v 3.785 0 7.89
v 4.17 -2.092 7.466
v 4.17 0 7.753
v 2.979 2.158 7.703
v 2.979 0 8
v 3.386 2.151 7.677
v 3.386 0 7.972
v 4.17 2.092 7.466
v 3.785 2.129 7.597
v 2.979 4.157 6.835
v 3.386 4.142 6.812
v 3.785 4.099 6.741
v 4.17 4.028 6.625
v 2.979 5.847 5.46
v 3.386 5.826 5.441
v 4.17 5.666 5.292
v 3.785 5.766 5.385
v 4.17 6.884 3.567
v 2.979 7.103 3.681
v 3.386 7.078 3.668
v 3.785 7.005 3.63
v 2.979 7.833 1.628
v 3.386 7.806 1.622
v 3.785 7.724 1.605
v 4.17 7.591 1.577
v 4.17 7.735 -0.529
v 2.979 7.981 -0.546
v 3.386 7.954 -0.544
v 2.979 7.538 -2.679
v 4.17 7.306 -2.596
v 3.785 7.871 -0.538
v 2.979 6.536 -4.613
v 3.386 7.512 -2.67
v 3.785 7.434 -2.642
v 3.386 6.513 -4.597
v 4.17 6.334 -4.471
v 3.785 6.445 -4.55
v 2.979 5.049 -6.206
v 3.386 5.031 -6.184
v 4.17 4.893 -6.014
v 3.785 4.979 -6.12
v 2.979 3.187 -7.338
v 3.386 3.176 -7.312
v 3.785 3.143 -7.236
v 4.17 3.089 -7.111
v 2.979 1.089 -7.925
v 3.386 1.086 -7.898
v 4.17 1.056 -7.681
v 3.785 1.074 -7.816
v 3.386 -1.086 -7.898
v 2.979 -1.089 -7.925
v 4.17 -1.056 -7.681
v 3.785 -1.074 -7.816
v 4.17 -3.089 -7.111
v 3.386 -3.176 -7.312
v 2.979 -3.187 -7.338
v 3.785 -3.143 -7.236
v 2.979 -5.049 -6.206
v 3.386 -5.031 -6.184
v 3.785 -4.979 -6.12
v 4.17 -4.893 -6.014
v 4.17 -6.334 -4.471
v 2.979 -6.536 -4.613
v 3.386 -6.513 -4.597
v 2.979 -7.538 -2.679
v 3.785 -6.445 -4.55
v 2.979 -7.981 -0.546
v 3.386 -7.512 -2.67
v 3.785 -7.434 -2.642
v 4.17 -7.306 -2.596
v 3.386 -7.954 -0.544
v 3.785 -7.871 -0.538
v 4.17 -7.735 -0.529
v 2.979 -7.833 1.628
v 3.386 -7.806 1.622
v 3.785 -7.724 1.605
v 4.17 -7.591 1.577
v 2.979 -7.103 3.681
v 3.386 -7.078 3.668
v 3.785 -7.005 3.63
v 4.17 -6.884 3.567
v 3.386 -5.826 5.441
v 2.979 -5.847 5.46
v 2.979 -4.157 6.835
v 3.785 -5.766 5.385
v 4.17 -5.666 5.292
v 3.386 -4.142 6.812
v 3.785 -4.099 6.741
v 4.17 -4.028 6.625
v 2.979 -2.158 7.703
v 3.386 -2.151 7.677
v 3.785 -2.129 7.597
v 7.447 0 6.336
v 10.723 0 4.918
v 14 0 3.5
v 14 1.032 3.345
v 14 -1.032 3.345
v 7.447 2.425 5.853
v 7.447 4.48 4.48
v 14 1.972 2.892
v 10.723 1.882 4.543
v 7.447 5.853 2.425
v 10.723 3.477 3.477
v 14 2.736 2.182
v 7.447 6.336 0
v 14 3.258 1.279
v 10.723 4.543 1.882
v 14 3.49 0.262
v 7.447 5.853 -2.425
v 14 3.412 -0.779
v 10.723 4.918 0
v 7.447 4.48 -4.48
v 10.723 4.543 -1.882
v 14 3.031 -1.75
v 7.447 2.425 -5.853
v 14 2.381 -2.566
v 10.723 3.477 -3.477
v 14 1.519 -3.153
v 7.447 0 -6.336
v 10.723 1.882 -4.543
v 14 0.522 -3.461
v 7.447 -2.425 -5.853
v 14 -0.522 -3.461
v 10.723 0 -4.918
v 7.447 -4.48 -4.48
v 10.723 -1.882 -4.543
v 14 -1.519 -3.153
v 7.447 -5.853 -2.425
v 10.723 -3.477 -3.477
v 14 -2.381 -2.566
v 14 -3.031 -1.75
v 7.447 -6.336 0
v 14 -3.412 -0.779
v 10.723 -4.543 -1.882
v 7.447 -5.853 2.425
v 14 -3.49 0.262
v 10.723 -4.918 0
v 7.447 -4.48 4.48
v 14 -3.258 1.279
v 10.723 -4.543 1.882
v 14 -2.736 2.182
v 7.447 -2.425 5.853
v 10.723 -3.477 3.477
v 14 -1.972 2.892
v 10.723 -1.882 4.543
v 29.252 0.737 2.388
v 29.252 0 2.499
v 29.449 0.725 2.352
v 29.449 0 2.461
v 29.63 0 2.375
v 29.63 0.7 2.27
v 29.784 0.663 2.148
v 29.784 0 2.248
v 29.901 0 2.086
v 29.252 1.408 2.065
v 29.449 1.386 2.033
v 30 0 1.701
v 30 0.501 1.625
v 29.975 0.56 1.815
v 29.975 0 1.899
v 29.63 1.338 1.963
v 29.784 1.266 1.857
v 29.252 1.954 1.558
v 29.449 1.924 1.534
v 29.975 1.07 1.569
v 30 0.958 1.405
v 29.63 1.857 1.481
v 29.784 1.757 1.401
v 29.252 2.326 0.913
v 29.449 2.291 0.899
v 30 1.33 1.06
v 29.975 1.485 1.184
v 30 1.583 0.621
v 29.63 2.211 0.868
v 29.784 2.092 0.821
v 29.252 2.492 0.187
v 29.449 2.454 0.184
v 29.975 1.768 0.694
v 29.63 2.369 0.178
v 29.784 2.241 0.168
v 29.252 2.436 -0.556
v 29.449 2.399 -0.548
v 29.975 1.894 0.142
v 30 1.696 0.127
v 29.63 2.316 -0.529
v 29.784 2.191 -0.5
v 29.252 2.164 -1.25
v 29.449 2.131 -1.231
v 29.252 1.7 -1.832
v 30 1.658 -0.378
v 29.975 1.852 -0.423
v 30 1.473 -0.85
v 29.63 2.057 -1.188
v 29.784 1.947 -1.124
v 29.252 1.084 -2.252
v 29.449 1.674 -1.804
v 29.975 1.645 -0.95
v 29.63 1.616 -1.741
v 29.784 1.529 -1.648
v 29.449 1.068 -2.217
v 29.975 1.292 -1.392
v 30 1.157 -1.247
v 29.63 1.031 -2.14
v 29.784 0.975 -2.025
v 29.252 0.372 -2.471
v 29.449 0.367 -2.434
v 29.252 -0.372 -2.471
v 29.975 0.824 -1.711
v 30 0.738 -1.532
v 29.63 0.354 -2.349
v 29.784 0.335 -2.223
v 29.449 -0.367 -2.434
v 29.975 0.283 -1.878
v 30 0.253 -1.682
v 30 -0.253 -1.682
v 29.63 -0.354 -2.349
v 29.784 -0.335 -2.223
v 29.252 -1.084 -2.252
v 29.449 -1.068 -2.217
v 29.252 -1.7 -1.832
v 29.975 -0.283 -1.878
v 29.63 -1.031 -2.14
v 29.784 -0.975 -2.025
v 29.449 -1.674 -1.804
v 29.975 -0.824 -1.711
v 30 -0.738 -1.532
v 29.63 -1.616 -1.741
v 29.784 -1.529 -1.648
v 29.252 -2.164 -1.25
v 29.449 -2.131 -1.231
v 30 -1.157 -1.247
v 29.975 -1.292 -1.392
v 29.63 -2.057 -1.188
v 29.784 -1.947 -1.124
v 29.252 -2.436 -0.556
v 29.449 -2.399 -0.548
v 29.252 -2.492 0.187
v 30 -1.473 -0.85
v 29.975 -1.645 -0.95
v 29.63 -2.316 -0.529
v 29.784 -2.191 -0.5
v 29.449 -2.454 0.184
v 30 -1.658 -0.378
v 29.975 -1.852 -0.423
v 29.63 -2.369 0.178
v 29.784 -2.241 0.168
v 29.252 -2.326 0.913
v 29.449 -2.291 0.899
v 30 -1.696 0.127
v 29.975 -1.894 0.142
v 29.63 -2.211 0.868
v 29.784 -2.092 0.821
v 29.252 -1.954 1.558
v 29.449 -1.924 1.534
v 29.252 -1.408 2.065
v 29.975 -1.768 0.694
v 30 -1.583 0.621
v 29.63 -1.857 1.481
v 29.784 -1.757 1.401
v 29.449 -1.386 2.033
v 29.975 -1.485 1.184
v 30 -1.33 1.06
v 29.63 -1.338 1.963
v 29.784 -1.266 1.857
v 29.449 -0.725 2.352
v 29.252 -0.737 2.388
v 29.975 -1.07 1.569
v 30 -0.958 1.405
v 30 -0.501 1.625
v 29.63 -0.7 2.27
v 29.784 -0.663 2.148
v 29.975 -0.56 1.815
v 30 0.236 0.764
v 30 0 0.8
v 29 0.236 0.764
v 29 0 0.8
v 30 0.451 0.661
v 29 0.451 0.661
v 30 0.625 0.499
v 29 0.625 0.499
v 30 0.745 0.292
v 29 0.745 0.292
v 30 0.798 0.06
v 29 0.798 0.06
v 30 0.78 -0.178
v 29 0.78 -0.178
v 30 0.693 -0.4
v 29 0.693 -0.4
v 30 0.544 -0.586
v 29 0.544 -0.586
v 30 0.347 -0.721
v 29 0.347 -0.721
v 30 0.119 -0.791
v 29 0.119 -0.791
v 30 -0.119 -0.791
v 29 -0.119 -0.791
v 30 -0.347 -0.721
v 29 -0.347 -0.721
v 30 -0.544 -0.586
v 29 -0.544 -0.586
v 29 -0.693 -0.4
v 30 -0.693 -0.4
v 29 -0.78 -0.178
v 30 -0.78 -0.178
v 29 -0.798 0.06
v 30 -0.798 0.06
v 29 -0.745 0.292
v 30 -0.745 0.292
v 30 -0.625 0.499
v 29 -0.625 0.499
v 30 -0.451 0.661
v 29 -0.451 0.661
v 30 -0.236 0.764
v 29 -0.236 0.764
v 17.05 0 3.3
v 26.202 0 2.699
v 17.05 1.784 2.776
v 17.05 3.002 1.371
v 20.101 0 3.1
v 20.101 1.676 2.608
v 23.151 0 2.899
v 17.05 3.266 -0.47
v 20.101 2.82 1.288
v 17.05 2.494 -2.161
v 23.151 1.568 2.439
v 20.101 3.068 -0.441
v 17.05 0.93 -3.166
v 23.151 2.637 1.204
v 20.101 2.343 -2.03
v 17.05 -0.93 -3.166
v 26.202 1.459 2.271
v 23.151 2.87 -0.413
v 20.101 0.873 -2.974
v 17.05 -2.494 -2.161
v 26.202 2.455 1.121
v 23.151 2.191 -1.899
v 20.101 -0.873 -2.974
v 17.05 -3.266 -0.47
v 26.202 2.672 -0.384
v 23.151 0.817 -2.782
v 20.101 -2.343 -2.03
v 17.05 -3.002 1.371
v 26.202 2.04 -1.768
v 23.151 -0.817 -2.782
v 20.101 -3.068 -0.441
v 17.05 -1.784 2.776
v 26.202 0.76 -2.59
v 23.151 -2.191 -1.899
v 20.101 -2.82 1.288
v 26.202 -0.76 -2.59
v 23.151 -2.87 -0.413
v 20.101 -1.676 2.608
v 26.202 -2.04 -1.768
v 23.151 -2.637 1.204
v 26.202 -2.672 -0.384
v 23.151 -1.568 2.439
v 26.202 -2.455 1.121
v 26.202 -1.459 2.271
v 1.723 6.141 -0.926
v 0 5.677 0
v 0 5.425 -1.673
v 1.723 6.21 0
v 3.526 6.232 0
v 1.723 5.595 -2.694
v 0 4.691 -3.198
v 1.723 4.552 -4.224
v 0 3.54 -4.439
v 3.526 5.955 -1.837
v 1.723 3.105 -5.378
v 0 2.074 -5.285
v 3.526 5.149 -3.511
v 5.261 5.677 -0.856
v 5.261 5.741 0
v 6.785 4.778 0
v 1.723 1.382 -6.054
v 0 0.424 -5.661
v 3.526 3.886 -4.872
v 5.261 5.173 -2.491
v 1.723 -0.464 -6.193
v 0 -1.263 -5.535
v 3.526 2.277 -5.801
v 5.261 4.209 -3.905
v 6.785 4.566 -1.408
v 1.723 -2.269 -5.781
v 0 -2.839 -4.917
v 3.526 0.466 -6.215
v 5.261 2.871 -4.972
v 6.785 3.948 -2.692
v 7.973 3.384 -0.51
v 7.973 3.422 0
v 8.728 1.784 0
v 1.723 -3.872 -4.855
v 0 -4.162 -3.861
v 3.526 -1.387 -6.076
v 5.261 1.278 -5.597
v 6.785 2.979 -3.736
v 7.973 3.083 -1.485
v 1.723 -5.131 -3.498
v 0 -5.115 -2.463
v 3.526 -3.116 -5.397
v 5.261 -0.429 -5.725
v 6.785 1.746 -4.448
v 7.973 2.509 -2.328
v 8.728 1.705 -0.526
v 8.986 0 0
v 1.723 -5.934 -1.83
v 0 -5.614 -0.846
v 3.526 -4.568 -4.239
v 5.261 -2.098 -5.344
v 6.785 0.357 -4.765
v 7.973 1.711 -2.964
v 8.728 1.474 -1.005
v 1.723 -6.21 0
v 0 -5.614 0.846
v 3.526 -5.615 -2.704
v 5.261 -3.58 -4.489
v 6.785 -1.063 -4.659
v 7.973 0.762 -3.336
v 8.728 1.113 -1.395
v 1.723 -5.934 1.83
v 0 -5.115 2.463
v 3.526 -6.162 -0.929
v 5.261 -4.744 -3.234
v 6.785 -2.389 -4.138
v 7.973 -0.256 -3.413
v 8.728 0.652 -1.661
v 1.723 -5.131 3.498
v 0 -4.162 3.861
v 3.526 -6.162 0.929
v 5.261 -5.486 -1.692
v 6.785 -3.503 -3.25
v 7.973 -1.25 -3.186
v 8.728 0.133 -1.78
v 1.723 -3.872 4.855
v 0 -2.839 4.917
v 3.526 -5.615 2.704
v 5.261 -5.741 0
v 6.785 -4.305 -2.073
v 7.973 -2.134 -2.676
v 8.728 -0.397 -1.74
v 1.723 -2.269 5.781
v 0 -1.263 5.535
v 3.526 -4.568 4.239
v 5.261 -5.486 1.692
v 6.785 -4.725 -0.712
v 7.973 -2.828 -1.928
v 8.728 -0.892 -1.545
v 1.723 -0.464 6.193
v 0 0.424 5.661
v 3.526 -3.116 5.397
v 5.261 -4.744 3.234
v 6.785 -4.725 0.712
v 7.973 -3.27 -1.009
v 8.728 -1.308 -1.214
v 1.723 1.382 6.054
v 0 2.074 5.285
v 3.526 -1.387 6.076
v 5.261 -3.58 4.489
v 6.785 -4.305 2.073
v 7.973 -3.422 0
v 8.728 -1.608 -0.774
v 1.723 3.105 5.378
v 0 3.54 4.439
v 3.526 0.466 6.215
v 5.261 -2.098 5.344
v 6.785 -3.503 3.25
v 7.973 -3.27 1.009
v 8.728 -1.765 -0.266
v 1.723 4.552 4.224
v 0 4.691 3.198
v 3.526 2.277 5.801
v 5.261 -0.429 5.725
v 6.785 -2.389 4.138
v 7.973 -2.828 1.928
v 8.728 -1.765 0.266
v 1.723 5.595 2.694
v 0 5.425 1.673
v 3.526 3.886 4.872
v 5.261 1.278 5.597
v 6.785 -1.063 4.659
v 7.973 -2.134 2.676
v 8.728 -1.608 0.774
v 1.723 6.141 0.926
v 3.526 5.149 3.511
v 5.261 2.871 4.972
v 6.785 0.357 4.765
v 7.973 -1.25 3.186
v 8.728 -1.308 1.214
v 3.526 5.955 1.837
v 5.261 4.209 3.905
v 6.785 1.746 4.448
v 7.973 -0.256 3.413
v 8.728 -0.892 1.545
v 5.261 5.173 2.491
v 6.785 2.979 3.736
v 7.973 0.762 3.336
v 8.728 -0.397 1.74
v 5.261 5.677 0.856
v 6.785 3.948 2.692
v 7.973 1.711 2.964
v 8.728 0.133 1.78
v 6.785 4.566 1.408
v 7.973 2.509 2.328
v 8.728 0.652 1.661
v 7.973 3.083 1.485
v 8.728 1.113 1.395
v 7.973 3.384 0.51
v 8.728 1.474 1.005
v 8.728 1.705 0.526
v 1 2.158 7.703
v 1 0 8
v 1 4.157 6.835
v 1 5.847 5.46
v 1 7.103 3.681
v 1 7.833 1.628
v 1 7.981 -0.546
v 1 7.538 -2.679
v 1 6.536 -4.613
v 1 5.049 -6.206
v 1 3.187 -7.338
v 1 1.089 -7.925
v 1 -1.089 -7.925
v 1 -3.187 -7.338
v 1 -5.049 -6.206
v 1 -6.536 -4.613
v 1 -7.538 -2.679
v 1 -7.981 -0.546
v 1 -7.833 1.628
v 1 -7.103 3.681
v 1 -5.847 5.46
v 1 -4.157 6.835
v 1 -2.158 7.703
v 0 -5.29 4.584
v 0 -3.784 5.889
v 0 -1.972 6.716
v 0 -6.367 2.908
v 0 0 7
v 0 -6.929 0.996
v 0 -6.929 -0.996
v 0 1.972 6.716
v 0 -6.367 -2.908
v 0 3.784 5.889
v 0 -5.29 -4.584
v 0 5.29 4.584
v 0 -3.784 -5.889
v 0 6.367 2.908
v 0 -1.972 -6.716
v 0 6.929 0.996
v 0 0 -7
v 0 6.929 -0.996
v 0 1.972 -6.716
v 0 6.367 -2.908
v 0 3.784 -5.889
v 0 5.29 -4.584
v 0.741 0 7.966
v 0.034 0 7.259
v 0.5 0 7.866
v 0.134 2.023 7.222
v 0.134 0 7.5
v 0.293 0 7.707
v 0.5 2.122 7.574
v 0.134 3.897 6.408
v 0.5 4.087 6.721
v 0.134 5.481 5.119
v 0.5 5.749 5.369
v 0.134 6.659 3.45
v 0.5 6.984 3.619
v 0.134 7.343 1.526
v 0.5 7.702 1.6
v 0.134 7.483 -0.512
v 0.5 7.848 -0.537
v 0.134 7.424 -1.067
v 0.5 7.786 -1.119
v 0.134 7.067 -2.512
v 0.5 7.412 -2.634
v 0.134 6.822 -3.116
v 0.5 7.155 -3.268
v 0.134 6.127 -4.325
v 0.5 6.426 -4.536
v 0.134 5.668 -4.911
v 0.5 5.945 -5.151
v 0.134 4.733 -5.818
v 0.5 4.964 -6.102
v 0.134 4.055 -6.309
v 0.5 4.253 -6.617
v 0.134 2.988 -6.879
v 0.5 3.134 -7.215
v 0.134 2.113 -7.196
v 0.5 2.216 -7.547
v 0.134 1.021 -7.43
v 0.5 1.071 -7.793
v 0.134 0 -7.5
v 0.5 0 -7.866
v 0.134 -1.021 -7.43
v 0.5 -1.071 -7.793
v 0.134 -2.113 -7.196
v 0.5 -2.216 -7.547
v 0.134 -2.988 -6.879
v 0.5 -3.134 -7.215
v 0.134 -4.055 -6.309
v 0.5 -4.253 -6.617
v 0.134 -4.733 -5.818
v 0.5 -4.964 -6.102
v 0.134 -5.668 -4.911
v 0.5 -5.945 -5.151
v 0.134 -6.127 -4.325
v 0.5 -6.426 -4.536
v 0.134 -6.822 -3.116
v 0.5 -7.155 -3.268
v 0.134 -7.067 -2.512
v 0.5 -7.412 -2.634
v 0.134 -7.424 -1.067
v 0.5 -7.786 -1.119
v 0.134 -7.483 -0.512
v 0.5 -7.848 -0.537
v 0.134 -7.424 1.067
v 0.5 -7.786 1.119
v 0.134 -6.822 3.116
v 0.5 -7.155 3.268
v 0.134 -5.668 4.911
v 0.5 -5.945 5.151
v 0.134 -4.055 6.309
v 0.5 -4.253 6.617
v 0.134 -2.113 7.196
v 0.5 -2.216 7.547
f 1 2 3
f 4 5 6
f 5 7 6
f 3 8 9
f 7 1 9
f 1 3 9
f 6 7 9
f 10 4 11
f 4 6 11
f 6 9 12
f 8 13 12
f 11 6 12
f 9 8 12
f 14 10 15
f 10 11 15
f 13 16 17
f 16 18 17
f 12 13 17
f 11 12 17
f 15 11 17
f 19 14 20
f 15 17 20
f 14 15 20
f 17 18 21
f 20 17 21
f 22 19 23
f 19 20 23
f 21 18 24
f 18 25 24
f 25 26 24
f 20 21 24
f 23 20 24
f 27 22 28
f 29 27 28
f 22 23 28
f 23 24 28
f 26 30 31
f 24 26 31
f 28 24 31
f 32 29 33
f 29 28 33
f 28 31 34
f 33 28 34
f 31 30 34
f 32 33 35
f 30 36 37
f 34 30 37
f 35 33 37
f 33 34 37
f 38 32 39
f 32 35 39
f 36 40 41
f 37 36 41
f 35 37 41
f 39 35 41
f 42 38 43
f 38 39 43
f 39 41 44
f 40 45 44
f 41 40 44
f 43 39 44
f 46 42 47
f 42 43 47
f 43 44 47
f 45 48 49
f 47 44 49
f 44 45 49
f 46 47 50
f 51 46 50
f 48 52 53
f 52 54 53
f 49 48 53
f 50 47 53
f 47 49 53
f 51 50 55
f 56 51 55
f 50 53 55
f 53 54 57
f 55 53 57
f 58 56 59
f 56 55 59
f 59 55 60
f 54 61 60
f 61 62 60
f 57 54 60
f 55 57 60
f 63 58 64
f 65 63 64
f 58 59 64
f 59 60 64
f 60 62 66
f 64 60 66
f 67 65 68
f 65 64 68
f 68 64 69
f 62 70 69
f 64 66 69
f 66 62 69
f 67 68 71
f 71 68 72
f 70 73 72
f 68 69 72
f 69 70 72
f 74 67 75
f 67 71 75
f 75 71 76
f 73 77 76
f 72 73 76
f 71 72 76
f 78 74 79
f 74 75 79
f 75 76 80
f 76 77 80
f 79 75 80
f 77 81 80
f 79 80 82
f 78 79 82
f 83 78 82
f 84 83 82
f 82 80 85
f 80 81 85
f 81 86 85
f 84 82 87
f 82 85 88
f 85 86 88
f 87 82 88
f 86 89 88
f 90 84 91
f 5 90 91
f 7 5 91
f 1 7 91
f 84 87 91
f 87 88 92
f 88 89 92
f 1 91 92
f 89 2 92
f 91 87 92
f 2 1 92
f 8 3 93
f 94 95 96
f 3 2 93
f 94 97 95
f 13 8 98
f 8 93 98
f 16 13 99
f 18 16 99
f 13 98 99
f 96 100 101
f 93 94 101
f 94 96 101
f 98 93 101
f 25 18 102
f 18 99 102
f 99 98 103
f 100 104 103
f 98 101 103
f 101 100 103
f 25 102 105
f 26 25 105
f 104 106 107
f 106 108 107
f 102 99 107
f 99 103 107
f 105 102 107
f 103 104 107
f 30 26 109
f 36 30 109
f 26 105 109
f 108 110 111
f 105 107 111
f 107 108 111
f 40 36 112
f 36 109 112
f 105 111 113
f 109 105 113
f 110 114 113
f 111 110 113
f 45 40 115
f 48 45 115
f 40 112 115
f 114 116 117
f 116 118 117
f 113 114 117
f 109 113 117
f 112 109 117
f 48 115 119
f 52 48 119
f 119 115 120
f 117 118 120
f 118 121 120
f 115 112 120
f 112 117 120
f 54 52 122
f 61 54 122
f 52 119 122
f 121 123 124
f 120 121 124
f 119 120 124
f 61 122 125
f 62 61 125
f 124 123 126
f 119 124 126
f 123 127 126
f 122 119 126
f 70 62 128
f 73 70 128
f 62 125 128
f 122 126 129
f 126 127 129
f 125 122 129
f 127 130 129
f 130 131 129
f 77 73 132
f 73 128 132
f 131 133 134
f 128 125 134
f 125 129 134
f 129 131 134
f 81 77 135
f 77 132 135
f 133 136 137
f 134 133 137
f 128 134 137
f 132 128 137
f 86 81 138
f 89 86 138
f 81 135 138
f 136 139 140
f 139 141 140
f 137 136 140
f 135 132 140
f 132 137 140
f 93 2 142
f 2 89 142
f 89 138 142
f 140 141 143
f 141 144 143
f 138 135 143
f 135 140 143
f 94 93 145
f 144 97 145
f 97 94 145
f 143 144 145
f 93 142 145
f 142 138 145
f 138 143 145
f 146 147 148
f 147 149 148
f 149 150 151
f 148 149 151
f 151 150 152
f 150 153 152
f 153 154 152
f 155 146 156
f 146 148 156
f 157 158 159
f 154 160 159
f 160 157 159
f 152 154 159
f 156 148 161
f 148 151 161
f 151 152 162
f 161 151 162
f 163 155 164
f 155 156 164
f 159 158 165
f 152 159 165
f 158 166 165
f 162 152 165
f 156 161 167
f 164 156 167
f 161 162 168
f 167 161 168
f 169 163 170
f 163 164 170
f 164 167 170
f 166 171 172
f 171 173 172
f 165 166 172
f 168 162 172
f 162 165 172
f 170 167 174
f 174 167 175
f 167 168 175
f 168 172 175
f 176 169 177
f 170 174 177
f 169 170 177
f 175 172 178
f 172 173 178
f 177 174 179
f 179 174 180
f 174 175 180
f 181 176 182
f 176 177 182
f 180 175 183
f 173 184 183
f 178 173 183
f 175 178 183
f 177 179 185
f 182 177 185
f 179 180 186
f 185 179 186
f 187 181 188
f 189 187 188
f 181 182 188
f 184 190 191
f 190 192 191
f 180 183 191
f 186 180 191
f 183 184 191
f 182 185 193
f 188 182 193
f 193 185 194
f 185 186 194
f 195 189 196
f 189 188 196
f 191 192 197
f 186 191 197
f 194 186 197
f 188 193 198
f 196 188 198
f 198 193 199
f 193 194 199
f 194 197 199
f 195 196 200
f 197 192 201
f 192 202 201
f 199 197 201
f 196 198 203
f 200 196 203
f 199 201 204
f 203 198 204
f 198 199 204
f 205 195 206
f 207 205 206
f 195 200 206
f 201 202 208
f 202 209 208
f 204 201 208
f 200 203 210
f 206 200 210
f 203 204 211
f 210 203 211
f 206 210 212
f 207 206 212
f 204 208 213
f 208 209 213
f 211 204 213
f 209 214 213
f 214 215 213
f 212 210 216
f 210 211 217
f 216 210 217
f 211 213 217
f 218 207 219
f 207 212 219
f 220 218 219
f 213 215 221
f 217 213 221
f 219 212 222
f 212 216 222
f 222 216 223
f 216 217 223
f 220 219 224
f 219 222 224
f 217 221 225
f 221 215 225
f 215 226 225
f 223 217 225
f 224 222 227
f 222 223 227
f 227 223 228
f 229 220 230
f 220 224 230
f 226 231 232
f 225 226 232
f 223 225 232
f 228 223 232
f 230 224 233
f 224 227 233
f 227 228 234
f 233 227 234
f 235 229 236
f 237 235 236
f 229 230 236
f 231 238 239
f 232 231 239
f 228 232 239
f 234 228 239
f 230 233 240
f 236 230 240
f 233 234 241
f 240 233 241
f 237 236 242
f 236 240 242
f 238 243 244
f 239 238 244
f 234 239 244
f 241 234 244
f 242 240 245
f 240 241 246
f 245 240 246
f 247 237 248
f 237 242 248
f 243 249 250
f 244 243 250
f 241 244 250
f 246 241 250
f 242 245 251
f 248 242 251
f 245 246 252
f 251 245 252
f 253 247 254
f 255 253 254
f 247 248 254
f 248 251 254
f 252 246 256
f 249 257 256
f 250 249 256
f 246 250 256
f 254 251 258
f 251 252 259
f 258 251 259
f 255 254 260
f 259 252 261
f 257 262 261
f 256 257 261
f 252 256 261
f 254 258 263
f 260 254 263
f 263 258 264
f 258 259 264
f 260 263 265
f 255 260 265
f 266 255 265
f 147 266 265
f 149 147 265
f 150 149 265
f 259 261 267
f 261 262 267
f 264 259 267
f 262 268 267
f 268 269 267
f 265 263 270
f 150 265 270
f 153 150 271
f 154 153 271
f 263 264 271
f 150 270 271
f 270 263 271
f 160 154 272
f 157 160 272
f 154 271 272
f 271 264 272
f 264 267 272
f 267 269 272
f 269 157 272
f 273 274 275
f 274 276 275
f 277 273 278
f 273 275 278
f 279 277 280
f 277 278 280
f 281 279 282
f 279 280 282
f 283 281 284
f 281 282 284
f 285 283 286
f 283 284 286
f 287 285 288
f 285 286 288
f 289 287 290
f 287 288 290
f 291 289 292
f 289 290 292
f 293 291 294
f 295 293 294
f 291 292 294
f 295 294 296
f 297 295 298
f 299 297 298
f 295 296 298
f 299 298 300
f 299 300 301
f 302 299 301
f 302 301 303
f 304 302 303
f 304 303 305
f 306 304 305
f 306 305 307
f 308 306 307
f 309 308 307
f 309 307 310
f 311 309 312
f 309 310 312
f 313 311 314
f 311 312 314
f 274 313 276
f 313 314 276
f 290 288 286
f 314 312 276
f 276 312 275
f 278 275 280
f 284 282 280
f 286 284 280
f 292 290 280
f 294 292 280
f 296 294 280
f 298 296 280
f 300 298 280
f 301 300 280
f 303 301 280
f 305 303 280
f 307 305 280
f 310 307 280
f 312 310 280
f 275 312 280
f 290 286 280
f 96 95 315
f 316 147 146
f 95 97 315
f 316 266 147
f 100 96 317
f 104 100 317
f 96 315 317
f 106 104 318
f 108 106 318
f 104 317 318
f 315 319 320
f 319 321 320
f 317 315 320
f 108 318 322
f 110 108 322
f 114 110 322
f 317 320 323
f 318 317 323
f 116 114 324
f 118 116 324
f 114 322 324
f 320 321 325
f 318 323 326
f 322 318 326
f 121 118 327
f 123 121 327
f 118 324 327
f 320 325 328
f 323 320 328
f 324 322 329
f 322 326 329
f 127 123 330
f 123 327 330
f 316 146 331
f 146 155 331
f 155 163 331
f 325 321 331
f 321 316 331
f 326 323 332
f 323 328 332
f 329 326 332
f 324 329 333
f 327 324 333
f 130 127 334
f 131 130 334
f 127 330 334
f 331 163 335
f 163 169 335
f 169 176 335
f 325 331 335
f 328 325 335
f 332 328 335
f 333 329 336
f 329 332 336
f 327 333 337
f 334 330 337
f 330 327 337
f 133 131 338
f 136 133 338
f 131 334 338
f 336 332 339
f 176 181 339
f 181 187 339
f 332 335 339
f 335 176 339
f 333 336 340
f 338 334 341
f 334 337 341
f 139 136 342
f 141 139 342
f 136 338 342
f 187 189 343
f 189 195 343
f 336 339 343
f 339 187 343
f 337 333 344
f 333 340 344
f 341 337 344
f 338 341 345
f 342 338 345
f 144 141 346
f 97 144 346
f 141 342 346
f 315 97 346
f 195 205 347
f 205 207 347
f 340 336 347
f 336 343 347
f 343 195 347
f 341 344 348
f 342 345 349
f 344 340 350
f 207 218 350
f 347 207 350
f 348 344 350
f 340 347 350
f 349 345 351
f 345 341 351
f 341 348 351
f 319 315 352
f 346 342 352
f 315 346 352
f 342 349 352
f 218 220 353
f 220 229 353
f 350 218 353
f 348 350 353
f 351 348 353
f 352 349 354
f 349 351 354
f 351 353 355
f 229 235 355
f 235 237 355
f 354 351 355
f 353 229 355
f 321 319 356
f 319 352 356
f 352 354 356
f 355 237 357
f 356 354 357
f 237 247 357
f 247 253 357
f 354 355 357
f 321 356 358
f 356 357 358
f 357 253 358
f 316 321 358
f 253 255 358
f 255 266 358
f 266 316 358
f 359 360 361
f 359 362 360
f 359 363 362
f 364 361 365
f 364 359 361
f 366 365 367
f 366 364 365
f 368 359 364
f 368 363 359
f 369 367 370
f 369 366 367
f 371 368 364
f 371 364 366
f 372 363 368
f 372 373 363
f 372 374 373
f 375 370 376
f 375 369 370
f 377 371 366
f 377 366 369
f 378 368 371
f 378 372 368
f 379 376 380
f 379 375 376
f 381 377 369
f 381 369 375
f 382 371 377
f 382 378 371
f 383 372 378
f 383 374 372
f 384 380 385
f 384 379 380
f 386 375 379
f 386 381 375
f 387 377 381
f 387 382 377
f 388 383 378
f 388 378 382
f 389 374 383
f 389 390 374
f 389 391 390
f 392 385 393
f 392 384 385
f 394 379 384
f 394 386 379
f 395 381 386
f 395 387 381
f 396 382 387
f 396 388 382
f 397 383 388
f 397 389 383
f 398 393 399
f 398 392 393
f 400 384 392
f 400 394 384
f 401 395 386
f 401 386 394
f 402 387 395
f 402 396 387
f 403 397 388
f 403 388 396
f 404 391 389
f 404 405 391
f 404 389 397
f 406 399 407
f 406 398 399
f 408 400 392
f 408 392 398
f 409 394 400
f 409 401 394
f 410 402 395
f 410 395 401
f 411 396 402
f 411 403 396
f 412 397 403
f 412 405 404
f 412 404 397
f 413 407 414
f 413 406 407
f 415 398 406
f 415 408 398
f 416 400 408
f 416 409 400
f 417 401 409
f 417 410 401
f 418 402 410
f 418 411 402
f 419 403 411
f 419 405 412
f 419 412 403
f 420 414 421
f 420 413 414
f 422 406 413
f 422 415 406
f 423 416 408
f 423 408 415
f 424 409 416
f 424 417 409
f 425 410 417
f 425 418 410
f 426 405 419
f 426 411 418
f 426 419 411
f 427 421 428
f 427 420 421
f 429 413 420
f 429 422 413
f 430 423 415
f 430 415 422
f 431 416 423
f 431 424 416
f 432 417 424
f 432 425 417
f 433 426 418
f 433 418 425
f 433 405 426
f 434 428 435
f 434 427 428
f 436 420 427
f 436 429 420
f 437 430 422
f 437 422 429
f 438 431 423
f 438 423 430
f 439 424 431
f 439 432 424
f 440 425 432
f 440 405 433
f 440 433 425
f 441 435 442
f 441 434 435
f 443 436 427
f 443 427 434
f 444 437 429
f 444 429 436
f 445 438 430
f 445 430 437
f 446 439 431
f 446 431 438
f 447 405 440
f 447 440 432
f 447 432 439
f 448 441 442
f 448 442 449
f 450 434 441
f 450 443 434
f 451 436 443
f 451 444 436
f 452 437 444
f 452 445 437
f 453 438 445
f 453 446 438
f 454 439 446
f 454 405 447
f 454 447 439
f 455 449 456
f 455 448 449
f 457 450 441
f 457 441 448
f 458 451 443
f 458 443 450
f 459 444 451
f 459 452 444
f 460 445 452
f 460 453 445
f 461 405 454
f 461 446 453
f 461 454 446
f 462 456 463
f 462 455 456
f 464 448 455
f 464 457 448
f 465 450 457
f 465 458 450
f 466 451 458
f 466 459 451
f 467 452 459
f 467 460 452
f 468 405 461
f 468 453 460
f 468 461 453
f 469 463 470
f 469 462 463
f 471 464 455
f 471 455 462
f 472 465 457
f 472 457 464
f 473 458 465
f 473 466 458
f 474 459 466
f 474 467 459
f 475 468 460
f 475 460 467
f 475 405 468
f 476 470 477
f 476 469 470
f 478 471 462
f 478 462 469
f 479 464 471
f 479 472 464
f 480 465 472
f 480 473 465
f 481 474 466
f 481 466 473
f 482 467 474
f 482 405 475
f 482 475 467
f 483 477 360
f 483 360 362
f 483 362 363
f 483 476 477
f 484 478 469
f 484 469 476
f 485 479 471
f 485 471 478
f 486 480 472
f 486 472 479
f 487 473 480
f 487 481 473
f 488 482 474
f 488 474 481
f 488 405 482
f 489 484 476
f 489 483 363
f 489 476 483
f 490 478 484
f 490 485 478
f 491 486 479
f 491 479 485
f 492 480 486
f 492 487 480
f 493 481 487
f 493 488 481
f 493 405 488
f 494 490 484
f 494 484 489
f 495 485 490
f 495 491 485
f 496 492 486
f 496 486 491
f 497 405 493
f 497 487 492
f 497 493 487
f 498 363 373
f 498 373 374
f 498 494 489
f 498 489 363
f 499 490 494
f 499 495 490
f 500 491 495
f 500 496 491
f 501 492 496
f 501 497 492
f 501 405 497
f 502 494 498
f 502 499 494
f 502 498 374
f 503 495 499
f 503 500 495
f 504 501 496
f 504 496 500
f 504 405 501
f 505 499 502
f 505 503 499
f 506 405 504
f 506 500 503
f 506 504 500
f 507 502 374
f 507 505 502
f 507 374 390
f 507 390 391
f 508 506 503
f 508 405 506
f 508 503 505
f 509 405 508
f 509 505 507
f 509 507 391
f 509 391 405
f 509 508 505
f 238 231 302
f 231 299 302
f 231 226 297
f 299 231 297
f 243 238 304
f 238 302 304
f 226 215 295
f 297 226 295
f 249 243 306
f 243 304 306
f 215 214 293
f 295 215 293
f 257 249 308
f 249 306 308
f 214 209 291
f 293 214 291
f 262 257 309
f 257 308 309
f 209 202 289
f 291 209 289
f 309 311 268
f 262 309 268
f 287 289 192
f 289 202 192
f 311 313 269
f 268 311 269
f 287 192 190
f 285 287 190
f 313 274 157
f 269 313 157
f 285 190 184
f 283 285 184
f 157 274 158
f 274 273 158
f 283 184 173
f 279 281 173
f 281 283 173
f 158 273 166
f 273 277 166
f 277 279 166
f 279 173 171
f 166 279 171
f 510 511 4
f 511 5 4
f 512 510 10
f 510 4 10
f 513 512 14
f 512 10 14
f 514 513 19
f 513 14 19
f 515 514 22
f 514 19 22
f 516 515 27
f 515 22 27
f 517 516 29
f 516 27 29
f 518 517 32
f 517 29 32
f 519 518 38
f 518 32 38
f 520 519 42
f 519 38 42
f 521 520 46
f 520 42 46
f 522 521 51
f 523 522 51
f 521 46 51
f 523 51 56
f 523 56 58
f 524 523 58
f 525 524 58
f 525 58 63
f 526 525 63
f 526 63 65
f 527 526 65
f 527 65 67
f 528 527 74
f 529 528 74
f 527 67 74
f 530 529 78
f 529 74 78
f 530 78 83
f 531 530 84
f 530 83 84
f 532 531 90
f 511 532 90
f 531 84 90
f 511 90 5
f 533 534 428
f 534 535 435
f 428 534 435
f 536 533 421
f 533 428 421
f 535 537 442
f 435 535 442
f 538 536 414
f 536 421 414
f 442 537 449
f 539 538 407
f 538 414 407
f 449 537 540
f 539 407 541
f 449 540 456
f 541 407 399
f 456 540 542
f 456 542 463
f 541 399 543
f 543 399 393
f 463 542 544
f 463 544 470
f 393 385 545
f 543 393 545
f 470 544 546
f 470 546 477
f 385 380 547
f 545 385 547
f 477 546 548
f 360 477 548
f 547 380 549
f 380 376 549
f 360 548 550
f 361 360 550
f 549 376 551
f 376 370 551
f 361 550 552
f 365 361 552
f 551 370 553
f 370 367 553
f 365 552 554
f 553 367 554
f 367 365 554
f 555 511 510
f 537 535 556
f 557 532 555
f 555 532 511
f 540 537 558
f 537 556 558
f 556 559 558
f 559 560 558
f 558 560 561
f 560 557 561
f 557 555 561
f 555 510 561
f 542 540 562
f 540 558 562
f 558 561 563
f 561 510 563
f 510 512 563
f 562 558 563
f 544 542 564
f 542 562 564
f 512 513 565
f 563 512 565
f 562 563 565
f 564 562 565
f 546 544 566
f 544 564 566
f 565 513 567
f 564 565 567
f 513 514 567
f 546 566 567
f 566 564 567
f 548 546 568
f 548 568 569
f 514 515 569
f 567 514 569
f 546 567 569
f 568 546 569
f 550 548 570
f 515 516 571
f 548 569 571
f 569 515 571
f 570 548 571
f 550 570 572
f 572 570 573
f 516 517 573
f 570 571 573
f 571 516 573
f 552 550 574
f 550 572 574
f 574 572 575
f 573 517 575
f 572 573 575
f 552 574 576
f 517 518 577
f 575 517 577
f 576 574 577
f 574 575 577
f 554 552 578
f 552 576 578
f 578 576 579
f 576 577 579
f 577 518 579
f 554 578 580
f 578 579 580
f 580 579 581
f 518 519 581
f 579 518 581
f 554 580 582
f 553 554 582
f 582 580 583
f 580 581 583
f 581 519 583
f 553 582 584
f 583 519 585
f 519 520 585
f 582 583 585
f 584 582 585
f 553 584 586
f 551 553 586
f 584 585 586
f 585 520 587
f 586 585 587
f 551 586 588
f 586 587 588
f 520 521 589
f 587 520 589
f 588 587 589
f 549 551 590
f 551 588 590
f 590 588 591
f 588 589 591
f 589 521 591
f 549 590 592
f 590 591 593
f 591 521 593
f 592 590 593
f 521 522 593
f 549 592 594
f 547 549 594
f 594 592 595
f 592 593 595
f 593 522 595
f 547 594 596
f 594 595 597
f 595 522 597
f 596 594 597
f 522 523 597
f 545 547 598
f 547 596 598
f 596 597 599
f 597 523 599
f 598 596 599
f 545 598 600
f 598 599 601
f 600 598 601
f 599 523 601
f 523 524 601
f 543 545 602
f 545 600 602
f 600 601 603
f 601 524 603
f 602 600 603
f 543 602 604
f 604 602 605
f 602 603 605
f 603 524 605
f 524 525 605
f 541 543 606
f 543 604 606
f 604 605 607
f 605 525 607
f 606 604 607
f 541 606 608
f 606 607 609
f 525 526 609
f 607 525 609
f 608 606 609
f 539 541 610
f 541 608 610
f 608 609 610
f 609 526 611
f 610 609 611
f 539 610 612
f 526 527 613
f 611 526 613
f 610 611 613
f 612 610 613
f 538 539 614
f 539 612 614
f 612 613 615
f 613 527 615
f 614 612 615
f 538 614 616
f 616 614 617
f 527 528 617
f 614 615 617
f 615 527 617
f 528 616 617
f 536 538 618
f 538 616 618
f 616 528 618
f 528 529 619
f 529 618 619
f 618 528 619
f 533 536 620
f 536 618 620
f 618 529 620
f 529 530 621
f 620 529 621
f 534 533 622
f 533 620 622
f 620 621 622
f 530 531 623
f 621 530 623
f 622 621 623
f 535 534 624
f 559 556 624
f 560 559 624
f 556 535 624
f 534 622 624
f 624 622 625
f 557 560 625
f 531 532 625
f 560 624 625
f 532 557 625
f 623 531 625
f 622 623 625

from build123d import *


with BuildPart() as part:
    # 草图1 → 旋转1 (revolve)
    with BuildSketch(Plane.XY):
        with BuildLine():
            Line((0, 0), (0, 7))
            ThreePointArc((0, 7), (0.292893219, 7.707106781), (1, 8))
            Line((1, 8), (2.978790918, 8))
            ThreePointArc((2.978790918, 8), (3.587095479, 7.937680303), (4.170127137, 7.753310373))
            Line((4.170127137, 7.753310373), (14, 3.5))
            Line((14, 3.5), (29.252387315, 2.499062082))
            ThreePointArc((29.252387315, 2.499062082), (29.783913457, 2.247629333), (30, 1.700779194))
            Line((30, 1.700779194), (30, 0.8))
            Line((30, 0.8), (29, 0.8))
            Line((29, 0.8), (29, 0))
            Line((29, 0), (0, 0))
        make_face()
    revolve(axis=Axis((30, 0, 0), (-1, 0, 0)))

    # 草图2 → 切除-旋转1 (revolve, cut)
    with BuildSketch(Plane.XY):
        with BuildLine():
            Line((8.9865, 0), (-3.5865, 0))
            ThreePointArc((-3.5865, 0), (2.7, 6.2865), (8.9865, 0))
        make_face()
    revolve(axis=Axis((50, 0, 0), (-1, 0, 0)), mode=Mode.SUBTRACT)


solid = part.part
